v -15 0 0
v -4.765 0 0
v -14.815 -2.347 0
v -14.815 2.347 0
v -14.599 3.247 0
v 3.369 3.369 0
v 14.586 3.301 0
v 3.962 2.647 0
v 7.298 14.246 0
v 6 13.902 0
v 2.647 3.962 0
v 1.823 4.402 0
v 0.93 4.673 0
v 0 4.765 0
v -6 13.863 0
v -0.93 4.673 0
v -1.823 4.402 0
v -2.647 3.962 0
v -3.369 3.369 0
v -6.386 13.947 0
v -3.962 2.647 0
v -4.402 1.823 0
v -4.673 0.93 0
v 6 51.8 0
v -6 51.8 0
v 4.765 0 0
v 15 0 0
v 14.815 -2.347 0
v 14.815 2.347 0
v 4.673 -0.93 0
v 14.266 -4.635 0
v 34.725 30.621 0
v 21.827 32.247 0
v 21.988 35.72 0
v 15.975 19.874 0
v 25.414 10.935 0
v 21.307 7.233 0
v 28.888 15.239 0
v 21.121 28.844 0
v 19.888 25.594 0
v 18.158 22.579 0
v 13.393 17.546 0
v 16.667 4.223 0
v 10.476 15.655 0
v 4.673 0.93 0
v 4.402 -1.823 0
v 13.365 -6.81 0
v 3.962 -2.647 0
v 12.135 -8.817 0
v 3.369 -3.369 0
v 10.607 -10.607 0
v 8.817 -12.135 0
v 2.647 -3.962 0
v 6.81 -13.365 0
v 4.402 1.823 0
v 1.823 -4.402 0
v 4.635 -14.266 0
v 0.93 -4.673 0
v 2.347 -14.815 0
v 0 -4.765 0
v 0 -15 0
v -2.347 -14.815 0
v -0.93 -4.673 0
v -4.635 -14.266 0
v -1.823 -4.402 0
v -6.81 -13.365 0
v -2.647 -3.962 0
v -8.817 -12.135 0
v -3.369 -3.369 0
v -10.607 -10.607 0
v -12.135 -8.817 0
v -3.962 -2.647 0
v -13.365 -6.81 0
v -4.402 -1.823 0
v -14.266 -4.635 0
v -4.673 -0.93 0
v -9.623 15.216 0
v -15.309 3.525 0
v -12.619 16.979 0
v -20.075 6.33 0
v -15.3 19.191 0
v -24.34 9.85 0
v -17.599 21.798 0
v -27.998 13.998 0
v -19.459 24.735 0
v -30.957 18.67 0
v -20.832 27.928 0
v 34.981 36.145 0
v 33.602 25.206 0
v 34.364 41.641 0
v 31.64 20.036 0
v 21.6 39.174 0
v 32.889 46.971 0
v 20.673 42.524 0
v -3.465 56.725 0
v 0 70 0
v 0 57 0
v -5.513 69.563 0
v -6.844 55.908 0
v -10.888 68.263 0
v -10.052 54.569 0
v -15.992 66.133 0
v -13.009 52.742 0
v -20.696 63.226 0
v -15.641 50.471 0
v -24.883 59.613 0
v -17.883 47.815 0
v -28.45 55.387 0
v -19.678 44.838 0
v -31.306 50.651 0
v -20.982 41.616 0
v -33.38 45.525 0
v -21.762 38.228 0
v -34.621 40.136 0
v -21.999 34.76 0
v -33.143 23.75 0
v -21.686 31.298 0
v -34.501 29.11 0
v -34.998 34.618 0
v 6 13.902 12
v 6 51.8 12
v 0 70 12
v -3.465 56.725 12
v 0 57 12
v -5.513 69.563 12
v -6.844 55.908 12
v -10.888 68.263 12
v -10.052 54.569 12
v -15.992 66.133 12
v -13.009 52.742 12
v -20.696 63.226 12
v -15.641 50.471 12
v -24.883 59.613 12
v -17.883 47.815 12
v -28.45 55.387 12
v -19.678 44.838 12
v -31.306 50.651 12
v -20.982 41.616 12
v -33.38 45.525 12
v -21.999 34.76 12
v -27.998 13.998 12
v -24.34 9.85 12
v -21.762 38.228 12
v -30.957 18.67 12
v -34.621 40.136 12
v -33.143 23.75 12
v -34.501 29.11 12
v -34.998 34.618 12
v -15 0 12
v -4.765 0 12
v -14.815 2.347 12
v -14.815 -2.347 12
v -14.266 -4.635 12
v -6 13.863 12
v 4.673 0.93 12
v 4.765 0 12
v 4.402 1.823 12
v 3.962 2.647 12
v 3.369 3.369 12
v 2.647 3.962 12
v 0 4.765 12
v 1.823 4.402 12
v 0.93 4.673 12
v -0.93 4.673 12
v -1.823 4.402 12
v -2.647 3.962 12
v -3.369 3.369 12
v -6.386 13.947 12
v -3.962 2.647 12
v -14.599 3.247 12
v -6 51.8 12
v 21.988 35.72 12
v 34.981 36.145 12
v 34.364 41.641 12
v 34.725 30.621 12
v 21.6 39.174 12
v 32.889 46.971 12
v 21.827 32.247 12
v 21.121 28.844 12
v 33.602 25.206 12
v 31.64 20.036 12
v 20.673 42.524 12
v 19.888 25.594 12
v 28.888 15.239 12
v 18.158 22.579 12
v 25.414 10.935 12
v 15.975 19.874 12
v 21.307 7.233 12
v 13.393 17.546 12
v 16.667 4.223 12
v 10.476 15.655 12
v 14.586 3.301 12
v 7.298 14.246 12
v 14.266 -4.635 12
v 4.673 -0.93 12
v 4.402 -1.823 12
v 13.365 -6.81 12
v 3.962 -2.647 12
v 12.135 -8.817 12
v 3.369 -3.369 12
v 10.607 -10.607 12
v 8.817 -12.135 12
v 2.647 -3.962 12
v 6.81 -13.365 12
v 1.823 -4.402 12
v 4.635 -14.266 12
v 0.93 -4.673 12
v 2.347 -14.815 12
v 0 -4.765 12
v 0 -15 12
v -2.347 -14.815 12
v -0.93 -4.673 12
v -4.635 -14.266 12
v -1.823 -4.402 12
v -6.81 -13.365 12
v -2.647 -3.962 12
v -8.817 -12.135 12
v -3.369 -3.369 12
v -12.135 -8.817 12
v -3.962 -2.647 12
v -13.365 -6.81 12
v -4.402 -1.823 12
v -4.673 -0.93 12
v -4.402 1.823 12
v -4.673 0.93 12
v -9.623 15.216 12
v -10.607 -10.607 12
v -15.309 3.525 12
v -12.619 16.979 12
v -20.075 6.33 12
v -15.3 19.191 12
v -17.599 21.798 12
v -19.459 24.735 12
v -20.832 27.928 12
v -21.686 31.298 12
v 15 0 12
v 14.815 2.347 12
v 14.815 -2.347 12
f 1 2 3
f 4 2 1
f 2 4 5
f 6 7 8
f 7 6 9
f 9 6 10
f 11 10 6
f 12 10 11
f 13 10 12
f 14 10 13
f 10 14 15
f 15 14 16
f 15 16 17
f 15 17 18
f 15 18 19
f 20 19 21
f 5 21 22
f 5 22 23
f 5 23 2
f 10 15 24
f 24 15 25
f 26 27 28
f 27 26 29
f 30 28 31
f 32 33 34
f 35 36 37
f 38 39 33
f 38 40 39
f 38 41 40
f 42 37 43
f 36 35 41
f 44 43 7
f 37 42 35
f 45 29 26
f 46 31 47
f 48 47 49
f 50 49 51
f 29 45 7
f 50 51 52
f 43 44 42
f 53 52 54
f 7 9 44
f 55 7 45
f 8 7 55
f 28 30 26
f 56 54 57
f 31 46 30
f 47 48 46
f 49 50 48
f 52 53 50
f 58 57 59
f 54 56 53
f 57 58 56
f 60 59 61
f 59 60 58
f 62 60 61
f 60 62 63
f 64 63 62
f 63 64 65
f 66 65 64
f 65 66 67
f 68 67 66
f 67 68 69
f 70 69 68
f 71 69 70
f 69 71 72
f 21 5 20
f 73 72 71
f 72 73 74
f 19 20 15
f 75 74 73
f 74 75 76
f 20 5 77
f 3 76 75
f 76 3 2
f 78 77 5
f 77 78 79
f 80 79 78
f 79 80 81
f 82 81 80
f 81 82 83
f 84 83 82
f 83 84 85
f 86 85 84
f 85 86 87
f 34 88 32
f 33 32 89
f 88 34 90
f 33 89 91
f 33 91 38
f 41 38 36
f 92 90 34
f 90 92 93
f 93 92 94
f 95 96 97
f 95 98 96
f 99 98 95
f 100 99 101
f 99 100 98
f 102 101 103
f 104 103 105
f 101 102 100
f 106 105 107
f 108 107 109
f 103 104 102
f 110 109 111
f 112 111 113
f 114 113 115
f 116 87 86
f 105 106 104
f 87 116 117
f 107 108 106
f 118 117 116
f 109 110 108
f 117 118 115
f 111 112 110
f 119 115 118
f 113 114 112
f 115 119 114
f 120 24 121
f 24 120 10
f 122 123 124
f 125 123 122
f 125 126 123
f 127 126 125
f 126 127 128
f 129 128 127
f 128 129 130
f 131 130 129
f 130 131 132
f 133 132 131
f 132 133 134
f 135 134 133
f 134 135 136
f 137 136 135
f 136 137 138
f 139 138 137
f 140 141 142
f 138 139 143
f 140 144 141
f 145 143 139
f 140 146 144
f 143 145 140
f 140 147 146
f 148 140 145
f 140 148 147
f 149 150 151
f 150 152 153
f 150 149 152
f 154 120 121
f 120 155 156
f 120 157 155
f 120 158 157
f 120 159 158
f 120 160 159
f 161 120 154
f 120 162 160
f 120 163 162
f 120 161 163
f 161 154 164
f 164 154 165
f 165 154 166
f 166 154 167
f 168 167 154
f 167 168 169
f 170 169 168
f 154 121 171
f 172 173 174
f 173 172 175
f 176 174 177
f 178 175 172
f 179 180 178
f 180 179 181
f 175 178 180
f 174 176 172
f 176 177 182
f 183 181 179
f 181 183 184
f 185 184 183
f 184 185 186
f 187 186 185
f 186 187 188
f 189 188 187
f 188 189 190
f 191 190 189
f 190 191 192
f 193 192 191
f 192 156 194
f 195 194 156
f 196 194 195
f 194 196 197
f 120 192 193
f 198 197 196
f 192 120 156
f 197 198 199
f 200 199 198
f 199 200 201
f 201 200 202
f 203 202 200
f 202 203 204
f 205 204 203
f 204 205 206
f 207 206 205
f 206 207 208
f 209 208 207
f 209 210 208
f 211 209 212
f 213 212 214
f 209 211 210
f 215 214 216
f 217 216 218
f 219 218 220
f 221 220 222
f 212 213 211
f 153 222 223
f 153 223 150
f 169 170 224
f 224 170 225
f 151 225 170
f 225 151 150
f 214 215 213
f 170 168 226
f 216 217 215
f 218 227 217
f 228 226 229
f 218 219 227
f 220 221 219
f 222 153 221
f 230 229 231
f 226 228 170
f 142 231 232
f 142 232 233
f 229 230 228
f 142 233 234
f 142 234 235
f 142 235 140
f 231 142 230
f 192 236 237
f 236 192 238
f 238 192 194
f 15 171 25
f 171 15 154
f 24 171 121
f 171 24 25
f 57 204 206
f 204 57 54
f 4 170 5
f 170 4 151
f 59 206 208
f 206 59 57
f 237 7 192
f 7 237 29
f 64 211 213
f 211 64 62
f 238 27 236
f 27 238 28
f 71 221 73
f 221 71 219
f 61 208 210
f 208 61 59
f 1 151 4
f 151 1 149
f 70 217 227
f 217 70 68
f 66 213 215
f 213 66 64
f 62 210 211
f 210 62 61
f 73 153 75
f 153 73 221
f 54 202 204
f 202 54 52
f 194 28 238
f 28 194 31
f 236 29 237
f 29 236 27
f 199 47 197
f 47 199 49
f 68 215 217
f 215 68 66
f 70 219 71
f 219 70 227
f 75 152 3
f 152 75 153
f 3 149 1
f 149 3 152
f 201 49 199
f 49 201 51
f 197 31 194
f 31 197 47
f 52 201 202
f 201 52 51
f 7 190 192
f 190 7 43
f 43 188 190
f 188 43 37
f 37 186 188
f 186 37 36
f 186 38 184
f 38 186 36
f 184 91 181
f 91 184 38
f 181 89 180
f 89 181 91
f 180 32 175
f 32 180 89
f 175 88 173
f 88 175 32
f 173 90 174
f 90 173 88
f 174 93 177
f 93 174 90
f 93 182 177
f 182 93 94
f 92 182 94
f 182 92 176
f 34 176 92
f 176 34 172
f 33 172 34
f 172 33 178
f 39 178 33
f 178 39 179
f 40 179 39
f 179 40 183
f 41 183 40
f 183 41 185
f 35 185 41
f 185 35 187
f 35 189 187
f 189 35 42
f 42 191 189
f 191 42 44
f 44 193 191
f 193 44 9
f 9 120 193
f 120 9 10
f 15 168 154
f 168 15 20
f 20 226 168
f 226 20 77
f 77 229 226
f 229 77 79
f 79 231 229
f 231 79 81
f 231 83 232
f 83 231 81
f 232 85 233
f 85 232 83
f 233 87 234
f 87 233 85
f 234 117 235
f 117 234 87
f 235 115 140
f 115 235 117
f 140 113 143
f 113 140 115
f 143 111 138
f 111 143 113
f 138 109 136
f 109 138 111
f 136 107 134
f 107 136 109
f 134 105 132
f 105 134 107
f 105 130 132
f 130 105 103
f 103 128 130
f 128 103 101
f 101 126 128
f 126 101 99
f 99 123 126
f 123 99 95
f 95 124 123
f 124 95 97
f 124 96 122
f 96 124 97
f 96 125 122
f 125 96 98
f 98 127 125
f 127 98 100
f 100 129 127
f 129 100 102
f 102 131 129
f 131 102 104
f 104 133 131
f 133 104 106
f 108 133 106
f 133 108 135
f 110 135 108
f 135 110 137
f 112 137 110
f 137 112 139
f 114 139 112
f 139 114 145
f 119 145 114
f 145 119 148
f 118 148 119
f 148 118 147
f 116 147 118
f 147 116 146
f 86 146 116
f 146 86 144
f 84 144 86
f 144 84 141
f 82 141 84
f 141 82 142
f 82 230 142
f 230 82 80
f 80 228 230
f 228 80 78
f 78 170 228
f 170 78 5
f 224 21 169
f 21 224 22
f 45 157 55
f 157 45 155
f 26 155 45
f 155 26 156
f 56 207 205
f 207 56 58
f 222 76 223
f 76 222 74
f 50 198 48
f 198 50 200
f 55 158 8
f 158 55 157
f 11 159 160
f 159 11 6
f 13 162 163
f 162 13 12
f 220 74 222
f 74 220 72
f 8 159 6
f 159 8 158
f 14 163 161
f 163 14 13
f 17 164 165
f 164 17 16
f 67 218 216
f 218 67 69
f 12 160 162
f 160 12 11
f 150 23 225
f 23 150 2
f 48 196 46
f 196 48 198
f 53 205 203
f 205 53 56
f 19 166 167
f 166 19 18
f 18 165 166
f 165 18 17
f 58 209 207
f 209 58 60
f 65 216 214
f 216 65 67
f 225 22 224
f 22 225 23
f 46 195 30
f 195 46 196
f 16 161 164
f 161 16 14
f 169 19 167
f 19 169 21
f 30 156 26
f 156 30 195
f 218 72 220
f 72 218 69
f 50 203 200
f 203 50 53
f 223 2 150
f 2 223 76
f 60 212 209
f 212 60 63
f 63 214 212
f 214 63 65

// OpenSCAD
$fn = 32;

// ----------------------------------------------------------------------
// Hook: 70 mm shank into a 22 mm curl, 12 mm thick
// ----------------------------------------------------------------------

// --- parameters (mm) ---
shank_len = 70;           // shank length from the boss centre
shank_w = 12;             // shank width
boss_d = 30;              // boss diameter
bore_d = 9.53;            // boss bore
curl_in = 22;             // curl inner radius
curl_out = 35;            // curl outer radius
curl_sweep = 290;         // curl sweep angle
hook_t = 12;              // hook thickness

shank_profile = [[-6, 51.8], [6, 51.8], [6, 13], [-6, 13]];
boss_profile = [[15, 0], [14.815, 2.347], [14.266, 4.635], [13.365, 6.81], [12.135, 8.817], [10.607, 10.607], [8.817, 12.135], [6.81, 13.365], [4.635, 14.266], [2.347, 14.815], [0, 15], [-2.347, 14.815], [-4.635, 14.266], [-6.81, 13.365], [-8.817, 12.135], [-10.607, 10.607], [-12.135, 8.817], [-13.365, 6.81], [-14.266, 4.635], [-14.815, 2.347], [-15, 0], [-14.815, -2.347], [-14.266, -4.635], [-13.365, -6.81], [-12.135, -8.817], [-10.607, -10.607], [-8.817, -12.135], [-6.81, -13.365], [-4.635, -14.266], [-2.347, -14.815], [0, -15], [2.347, -14.815], [4.635, -14.266], [6.81, -13.365], [8.817, -12.135], [10.607, -10.607], [12.135, -8.817], [13.365, -6.81], [14.266, -4.635], [14.815, -2.347]];
curl_profile = [[0, 70], [-5.513, 69.563], [-10.888, 68.263], [-15.992, 66.133], [-20.696, 63.226], [-24.883, 59.613], [-28.45, 55.387], [-31.306, 50.651], [-33.38, 45.525], [-34.621, 40.136], [-34.998, 34.618], [-34.501, 29.11], [-33.143, 23.75], [-30.957, 18.67], [-27.998, 13.998], [-24.34, 9.85], [-20.075, 6.33], [-15.309, 3.525], [-10.16, 1.507], [-4.758, 0.325], [0.764, 0.008], [6.266, 0.565], [11.611, 1.982], [16.667, 4.223], [21.307, 7.233], [25.414, 10.935], [28.888, 15.239], [31.64, 20.036], [33.602, 25.206], [34.725, 30.621], [34.981, 36.145], [34.364, 41.641], [32.889, 46.971], [20.673, 42.524], [21.6, 39.174], [21.988, 35.72], [21.827, 32.247], [21.121, 28.844], [19.888, 25.594], [18.158, 22.579], [15.975, 19.874], [13.393, 17.546], [10.476, 15.655], [7.298, 14.246], [3.938, 13.355], [0.48, 13.005], [-2.99, 13.204], [-6.386, 13.947], [-9.623, 15.216], [-12.619, 16.979], [-15.3, 19.191], [-17.599, 21.798], [-19.459, 24.735], [-20.832, 27.928], [-21.686, 31.298], [-21.999, 34.76], [-21.762, 38.228], [-20.982, 41.616], [-19.678, 44.838], [-17.883, 47.815], [-15.641, 50.471], [-13.009, 52.742], [-10.052, 54.569], [-6.844, 55.908], [-3.465, 56.725], [0, 57]];

difference() {
  union() {
    /* three overlapping outlines: shank, boss and the smooth curl */
    linear_extrude(height = hook_t) polygon(shank_profile);
    linear_extrude(height = hook_t) polygon(boss_profile);
    linear_extrude(height = hook_t) polygon(curl_profile);
  }
  translate([0, 0, -2.5]) cylinder(h = hook_t + 5, d = bore_d);
}
